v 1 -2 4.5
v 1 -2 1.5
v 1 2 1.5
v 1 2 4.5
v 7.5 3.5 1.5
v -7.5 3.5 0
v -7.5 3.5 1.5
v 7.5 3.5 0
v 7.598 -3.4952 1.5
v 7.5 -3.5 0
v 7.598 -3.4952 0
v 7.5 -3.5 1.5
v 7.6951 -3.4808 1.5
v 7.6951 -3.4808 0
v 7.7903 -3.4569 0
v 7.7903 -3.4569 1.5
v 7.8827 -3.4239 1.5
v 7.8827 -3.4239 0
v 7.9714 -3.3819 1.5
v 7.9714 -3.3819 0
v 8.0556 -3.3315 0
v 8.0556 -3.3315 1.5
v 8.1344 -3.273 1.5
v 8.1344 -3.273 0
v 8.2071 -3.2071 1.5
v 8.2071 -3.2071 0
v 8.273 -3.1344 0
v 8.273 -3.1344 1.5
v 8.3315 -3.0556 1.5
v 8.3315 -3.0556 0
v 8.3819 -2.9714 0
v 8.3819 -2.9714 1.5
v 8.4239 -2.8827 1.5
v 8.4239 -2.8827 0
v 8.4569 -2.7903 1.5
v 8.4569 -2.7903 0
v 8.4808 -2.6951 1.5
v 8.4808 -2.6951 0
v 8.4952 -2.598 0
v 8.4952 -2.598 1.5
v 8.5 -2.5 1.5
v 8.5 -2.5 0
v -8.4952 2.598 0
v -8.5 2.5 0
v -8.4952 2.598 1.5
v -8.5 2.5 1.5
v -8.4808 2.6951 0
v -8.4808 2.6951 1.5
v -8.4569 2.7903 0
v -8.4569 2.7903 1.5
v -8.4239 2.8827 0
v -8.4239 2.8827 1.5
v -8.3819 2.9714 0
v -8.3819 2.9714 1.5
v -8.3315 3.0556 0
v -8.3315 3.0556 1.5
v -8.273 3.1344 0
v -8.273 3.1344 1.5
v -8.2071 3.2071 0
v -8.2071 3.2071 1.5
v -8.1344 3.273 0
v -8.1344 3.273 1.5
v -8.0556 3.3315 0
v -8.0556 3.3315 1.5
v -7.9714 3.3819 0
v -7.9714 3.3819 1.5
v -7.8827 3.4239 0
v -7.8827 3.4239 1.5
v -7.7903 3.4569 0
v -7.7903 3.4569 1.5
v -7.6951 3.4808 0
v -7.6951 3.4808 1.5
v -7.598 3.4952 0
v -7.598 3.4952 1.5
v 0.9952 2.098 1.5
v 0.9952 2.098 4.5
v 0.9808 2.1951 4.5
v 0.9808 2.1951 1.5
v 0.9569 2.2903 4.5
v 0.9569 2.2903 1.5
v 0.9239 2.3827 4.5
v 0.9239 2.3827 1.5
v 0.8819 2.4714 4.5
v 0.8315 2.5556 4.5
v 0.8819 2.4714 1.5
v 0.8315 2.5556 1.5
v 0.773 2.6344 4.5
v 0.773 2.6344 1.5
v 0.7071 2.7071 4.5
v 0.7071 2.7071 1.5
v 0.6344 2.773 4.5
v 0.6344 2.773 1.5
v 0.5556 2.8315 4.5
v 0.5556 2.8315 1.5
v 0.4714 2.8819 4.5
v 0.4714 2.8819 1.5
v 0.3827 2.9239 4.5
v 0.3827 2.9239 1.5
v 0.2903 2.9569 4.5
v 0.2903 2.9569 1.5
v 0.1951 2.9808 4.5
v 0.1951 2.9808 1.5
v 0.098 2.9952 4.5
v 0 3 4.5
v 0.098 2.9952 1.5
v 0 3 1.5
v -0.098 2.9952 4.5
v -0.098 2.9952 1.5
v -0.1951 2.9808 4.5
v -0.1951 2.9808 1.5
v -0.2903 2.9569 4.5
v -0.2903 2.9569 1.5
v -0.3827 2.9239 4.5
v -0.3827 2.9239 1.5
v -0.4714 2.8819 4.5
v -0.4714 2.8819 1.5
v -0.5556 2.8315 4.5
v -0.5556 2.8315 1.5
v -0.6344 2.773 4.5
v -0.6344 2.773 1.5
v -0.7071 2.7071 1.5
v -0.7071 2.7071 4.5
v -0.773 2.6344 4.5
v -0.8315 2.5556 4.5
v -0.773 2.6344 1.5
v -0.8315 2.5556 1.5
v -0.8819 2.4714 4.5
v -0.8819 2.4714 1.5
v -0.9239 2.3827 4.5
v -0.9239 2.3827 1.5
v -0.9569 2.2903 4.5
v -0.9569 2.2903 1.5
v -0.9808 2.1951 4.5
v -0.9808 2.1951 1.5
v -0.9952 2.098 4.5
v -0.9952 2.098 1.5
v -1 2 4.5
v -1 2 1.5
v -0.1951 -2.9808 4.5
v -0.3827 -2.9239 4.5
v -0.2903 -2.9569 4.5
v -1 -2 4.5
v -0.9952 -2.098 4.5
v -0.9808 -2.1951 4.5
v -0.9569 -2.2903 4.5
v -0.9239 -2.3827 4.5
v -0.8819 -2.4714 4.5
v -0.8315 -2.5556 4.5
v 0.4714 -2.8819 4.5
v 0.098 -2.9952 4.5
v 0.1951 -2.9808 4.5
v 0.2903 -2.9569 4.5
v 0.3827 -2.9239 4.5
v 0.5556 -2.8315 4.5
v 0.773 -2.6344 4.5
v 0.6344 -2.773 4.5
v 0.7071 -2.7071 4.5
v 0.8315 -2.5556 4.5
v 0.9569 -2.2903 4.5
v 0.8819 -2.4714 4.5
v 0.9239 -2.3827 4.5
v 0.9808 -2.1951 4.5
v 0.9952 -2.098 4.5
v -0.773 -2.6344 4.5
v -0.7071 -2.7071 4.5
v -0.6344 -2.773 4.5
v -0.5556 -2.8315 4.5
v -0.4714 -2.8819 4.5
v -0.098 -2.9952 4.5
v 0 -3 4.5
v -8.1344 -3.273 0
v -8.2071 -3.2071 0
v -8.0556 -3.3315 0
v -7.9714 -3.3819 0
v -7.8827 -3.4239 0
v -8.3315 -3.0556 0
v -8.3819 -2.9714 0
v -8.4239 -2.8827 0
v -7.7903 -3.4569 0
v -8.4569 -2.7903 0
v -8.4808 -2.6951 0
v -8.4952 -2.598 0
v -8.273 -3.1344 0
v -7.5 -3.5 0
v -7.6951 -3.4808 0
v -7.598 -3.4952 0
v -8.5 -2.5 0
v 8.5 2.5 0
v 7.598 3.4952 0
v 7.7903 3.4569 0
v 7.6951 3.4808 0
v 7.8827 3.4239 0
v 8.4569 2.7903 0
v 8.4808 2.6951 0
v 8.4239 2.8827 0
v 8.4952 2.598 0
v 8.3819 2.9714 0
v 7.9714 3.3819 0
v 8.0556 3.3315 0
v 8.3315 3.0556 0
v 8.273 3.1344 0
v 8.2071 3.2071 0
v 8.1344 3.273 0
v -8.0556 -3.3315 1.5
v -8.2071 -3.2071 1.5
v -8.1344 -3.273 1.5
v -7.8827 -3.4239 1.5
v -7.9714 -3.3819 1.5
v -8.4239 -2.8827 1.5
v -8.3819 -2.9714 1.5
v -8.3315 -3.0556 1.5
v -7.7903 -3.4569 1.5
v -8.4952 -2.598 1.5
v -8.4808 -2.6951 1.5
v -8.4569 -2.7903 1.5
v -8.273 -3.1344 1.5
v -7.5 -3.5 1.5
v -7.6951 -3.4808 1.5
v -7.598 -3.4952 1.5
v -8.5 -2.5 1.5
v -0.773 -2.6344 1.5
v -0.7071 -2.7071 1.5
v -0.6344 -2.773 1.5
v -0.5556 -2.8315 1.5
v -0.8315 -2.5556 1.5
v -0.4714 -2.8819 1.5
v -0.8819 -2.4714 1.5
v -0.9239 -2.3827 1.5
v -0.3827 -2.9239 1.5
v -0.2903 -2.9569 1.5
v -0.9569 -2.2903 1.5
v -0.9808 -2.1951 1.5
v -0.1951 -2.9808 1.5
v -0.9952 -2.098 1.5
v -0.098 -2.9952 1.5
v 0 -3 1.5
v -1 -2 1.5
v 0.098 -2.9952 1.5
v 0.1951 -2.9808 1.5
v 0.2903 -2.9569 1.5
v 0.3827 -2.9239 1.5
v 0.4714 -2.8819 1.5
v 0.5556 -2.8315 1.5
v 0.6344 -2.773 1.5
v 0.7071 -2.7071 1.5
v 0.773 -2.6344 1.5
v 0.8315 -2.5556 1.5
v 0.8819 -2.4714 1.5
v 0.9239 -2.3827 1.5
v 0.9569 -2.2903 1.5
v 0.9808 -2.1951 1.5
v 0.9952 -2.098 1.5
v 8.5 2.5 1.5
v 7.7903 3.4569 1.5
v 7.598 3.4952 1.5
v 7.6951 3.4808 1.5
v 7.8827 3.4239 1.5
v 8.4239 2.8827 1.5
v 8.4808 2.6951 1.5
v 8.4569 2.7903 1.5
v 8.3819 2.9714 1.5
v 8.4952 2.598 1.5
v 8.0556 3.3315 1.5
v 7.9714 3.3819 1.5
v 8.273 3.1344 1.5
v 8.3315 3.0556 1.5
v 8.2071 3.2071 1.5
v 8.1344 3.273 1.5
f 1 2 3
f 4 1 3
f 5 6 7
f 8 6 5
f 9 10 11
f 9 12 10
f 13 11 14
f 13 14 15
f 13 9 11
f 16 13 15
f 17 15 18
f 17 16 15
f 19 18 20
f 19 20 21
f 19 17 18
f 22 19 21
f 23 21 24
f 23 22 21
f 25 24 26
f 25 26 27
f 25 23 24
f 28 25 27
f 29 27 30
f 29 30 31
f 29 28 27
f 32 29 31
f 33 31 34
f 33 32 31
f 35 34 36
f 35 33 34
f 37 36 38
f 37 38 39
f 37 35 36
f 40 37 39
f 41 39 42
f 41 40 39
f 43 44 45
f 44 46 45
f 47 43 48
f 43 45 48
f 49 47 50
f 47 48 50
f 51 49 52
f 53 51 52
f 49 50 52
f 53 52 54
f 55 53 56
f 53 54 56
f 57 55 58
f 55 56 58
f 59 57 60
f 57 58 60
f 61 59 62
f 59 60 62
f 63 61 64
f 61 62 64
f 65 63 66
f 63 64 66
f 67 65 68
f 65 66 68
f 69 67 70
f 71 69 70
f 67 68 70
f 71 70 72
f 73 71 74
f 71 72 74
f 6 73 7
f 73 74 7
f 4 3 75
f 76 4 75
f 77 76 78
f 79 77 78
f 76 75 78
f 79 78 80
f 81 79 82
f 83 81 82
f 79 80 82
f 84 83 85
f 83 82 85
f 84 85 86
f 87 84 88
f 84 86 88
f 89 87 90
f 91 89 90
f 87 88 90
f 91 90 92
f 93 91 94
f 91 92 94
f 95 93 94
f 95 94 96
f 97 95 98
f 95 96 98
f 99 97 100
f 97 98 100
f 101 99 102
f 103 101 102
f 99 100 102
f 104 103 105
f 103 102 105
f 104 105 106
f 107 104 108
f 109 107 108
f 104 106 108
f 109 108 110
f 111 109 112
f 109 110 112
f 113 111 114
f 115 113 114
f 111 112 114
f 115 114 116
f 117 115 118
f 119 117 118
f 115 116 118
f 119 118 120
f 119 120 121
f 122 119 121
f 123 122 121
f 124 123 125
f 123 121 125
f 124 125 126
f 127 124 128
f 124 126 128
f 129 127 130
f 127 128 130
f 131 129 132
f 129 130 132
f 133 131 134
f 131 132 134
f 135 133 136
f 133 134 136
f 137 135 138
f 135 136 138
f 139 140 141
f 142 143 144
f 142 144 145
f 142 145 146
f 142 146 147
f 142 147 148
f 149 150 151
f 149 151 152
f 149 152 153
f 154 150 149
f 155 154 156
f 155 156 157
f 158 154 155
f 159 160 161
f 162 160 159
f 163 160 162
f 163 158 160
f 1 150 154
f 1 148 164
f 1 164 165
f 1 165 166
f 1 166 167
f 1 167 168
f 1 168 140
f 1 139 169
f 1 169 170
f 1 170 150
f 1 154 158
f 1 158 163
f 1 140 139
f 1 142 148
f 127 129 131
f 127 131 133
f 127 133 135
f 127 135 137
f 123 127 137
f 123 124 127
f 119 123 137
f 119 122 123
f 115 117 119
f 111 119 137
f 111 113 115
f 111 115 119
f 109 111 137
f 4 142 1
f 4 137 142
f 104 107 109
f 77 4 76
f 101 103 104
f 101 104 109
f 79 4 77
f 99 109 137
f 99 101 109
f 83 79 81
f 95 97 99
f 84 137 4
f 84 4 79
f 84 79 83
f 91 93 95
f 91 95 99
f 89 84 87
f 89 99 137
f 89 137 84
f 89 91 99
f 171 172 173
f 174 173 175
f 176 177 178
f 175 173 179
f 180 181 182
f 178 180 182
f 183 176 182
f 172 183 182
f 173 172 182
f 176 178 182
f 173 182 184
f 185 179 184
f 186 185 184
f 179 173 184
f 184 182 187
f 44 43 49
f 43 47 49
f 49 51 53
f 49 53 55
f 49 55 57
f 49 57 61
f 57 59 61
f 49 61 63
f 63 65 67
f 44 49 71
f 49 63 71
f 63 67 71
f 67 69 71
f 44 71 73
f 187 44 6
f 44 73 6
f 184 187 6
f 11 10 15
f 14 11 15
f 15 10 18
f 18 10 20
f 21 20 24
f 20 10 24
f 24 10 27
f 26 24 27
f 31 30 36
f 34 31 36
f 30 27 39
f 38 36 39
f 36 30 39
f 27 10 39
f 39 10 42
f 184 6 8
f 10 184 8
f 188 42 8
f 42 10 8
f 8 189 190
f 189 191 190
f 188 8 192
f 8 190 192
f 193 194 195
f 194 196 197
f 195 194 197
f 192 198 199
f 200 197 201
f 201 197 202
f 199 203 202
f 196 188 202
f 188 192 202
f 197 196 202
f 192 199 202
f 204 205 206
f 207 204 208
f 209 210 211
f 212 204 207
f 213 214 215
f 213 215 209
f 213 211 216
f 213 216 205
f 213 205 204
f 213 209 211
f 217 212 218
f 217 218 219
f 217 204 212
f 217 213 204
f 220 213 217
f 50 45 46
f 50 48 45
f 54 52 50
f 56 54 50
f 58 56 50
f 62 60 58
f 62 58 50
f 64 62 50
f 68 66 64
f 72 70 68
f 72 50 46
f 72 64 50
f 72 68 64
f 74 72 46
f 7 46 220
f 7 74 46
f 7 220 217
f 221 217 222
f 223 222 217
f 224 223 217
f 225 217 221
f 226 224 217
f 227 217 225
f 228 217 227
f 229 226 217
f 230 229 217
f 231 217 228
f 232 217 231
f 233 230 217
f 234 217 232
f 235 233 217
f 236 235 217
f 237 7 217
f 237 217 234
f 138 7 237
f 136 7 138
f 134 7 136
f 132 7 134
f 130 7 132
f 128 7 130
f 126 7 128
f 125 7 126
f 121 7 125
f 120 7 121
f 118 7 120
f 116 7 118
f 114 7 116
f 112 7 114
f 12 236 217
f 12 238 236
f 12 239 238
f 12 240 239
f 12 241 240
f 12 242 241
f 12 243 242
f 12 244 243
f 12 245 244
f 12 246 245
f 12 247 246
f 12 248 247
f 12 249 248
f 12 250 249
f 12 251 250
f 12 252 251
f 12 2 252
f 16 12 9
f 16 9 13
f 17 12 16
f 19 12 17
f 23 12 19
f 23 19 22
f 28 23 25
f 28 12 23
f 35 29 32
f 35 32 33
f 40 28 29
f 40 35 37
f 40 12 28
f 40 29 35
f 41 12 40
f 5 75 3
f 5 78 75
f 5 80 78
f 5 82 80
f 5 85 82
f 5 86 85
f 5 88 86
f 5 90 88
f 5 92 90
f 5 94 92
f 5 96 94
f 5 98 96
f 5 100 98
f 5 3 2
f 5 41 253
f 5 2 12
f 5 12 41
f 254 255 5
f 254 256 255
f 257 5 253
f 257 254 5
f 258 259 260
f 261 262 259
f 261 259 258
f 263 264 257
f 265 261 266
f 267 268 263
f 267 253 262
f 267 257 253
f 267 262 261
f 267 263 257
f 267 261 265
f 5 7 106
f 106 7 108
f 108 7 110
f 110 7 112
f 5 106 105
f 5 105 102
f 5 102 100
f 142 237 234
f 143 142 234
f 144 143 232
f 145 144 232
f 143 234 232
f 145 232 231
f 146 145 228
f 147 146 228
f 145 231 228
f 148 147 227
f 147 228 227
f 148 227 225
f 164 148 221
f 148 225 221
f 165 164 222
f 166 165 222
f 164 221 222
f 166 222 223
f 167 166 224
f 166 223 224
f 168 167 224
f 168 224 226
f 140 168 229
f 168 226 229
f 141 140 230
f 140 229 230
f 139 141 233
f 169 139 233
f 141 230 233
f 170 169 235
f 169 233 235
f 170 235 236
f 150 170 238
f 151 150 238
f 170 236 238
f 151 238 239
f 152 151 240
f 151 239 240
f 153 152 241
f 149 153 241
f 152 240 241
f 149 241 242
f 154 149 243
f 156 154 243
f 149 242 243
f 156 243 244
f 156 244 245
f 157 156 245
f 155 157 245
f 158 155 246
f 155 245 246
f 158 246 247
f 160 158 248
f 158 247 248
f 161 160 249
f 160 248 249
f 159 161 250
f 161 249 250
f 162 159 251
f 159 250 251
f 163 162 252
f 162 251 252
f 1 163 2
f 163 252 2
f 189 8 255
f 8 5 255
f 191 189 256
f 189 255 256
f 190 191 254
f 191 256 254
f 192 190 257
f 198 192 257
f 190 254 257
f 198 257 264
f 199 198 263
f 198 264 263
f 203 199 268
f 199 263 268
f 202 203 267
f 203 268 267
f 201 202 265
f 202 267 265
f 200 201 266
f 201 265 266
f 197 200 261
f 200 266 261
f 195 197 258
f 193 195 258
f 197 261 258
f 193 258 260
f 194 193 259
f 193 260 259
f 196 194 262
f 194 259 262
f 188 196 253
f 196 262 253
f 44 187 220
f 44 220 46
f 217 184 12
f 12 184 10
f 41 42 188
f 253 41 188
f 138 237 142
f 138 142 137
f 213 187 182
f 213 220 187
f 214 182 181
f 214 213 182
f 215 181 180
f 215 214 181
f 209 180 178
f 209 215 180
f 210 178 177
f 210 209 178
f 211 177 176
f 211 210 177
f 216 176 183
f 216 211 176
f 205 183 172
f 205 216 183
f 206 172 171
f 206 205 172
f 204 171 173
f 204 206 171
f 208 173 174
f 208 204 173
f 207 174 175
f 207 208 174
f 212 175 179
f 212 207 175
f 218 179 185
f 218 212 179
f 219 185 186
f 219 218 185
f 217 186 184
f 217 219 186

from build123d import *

# Parameters (mm, degrees)
F0_W     = 17
F0_H     = 7
F1_DEPTH = 1.5
F2_W     = 2
F2_H     = 4
F3_DEPTH = 3
F4_R     = 1


with BuildPart() as f1:
    # F0 (on Top) → F1 (new body)
    with BuildSketch(Plane.XY):
        Rectangle(F0_W, F0_H)
    extrude(amount=F1_DEPTH)

    # F2 (on face) → F3 (join)
    with BuildSketch(Plane.XY.offset(1.5)):
        with BuildLine():
            ThreePointArc((-1, -2), (0, -3), (1, -2))
            Line((1, -2), (-1, -2))
        make_face()
        Rectangle(F2_W, F2_H)
        with BuildLine():
            Line((-1, 2), (1, 2))
            ThreePointArc((1, 2), (0, 3), (-1, 2))
        make_face()
    extrude(amount=F3_DEPTH)

    # F4
    f4_edges = [f1.edges().sort_by_distance(p)[0] for p in [
        (-8.5, 3.5, 0.75),
        (-8.5, -3.5, 0.75),
        (8.5, 3.5, 0.75),
        (8.5, -3.5, 0.75),
    ]]
    fillet(f4_edges, radius=F4_R)


solid = f1.part
